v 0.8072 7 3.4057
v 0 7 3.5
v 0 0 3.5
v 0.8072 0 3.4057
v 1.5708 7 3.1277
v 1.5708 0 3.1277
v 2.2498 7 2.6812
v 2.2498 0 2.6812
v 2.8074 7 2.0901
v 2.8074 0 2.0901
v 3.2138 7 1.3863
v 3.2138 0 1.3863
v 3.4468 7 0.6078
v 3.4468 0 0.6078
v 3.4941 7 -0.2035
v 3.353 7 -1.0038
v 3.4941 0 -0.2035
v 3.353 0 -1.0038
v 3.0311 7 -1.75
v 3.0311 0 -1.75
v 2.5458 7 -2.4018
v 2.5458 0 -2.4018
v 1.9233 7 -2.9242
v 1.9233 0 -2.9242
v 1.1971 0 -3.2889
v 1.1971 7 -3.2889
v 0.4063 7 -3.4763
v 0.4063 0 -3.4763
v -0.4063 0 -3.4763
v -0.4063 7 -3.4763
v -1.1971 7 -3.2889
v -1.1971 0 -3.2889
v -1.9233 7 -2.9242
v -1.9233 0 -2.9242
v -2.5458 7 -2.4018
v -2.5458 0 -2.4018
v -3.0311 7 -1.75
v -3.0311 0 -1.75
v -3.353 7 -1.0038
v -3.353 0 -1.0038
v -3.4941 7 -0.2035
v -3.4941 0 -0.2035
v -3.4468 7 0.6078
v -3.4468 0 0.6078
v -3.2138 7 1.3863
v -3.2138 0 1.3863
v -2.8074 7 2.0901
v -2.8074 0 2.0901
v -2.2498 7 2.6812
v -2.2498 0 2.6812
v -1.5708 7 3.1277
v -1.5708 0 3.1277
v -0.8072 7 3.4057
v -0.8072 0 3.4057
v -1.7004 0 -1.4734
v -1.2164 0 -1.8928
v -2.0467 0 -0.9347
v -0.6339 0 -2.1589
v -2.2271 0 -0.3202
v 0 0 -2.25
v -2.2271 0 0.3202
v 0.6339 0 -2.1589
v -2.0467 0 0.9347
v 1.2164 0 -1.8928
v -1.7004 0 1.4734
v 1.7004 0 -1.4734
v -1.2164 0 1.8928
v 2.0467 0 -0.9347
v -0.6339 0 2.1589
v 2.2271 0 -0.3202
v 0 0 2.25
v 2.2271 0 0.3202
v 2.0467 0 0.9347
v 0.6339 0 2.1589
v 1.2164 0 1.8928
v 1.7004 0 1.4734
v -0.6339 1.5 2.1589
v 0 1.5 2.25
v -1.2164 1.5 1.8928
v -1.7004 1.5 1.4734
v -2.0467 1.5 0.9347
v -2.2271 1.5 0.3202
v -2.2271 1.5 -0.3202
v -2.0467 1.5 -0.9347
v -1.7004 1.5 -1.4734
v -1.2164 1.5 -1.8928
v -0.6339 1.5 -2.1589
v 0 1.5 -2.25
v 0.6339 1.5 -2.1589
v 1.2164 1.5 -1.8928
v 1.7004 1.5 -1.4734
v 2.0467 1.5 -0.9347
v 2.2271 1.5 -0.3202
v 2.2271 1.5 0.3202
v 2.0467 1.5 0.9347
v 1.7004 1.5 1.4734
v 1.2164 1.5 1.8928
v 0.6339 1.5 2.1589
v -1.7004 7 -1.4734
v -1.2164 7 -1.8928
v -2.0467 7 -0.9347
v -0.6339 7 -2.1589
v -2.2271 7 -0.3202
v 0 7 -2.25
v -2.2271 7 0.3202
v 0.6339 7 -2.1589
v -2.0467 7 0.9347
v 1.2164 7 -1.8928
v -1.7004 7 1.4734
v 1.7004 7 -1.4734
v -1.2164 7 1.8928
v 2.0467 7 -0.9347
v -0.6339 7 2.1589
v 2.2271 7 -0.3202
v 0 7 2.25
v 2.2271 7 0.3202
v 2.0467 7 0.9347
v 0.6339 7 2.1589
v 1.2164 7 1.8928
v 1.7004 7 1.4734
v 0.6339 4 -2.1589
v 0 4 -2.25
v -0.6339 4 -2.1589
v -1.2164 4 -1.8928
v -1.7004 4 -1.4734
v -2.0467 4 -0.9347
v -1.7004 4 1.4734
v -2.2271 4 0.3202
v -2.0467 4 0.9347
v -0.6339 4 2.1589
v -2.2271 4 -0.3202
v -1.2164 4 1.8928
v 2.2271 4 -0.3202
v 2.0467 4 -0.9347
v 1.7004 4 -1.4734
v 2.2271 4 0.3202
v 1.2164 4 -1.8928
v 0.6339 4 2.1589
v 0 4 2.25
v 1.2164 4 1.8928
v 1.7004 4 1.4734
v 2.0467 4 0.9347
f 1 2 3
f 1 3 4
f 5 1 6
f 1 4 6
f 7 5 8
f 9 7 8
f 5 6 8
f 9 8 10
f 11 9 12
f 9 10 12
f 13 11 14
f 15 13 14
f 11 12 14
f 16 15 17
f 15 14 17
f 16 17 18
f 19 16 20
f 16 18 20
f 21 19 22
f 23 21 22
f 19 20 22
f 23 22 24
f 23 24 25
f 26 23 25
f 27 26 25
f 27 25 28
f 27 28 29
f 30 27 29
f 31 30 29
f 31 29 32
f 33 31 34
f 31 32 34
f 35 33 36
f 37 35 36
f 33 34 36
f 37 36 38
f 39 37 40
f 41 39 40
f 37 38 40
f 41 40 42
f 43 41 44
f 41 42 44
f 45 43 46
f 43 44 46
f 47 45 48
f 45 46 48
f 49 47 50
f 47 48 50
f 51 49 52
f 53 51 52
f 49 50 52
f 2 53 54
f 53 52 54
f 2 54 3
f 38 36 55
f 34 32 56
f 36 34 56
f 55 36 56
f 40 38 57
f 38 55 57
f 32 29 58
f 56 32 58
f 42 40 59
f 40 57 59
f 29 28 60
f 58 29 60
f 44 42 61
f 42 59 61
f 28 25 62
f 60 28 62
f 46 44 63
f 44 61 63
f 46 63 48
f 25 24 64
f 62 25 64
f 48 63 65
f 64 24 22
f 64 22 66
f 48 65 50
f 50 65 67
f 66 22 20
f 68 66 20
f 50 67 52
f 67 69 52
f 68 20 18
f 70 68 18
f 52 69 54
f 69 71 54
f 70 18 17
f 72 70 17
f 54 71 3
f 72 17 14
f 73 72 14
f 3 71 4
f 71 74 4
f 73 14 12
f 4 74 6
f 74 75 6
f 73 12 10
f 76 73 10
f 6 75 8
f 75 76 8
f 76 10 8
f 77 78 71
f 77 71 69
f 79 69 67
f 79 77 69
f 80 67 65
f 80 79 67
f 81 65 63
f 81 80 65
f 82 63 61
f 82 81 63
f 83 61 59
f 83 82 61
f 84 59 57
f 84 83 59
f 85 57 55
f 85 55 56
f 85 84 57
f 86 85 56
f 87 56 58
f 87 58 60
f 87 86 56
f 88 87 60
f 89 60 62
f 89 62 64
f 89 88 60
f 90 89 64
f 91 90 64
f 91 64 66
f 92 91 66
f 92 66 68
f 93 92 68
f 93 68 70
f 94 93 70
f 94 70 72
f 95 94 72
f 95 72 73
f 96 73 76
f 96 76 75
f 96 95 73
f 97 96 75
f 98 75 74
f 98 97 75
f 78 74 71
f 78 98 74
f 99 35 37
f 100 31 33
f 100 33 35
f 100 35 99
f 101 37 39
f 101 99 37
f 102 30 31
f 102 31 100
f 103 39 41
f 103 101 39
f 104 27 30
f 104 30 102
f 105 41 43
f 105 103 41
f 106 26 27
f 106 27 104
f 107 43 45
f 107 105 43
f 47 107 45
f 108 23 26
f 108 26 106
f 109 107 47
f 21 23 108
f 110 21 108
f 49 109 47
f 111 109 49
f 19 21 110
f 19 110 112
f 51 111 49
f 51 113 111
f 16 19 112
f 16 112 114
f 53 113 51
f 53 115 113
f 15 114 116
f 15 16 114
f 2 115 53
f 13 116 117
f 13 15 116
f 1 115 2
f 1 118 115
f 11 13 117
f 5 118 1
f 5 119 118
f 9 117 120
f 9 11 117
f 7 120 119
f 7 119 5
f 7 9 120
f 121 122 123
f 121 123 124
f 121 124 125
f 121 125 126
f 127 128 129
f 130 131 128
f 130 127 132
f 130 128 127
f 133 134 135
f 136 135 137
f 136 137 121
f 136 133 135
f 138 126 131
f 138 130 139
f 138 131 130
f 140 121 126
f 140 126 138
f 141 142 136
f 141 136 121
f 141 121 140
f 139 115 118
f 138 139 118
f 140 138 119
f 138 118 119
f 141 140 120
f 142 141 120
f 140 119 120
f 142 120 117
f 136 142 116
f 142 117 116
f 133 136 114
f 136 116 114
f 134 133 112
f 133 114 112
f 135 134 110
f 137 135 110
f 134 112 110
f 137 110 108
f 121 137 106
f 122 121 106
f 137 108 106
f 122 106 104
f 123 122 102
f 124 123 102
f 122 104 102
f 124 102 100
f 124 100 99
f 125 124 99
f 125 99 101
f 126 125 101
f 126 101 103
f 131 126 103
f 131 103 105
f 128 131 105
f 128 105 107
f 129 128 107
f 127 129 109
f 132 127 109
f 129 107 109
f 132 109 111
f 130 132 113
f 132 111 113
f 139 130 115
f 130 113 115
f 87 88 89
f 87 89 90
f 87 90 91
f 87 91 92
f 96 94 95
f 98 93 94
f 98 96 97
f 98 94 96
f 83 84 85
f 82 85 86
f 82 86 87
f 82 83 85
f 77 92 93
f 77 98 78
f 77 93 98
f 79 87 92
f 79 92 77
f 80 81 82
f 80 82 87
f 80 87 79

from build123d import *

# Parameters (mm, degrees)
CROQUIS1_R              = 3.5
SALIENTE_EXTRUIR1_DEPTH = 7
CROQUIS2_R              = 2.25
CORTAR_EXTRUIR1_DEPTH   = 3
CORTAR_EXTRUIR2_START   = -1.5
CROQUIS3_R              = 2.25
CORTAR_EXTRUIR2_DEPTH   = 1.5


with BuildPart() as part:
    # Croquis1 → Saliente-Extruir1 (new body)
    with BuildSketch(Plane(origin=(0, 0, 0), x_dir=(1, 0, 0), z_dir=(0, 1, 0))):
        with Locations(Location((0, 0, 0), (0, 0, 270))):
            Circle(CROQUIS1_R)
    extrude(amount=SALIENTE_EXTRUIR1_DEPTH)

    # Croquis2 → Cortar-Extruir1 (cut)
    with BuildSketch(Plane(origin=(0, 7, 0), x_dir=(1, 0, 0), z_dir=(0, 1, 0))):
        with Locations(Location((0, 0, 0), (0, 0, 270))):
            Circle(CROQUIS2_R)
    extrude(amount=-CORTAR_EXTRUIR1_DEPTH, mode=Mode.SUBTRACT)

    # Croquis3 → Cortar-Extruir2 (cut)
    with BuildSketch(Plane.XZ.offset(CORTAR_EXTRUIR2_START)):
        with Locations(Location((0, 0, 0), (0, 0, 90))):
            Circle(CROQUIS3_R)
    extrude(amount=CORTAR_EXTRUIR2_DEPTH, mode=Mode.SUBTRACT)


solid = part.part
